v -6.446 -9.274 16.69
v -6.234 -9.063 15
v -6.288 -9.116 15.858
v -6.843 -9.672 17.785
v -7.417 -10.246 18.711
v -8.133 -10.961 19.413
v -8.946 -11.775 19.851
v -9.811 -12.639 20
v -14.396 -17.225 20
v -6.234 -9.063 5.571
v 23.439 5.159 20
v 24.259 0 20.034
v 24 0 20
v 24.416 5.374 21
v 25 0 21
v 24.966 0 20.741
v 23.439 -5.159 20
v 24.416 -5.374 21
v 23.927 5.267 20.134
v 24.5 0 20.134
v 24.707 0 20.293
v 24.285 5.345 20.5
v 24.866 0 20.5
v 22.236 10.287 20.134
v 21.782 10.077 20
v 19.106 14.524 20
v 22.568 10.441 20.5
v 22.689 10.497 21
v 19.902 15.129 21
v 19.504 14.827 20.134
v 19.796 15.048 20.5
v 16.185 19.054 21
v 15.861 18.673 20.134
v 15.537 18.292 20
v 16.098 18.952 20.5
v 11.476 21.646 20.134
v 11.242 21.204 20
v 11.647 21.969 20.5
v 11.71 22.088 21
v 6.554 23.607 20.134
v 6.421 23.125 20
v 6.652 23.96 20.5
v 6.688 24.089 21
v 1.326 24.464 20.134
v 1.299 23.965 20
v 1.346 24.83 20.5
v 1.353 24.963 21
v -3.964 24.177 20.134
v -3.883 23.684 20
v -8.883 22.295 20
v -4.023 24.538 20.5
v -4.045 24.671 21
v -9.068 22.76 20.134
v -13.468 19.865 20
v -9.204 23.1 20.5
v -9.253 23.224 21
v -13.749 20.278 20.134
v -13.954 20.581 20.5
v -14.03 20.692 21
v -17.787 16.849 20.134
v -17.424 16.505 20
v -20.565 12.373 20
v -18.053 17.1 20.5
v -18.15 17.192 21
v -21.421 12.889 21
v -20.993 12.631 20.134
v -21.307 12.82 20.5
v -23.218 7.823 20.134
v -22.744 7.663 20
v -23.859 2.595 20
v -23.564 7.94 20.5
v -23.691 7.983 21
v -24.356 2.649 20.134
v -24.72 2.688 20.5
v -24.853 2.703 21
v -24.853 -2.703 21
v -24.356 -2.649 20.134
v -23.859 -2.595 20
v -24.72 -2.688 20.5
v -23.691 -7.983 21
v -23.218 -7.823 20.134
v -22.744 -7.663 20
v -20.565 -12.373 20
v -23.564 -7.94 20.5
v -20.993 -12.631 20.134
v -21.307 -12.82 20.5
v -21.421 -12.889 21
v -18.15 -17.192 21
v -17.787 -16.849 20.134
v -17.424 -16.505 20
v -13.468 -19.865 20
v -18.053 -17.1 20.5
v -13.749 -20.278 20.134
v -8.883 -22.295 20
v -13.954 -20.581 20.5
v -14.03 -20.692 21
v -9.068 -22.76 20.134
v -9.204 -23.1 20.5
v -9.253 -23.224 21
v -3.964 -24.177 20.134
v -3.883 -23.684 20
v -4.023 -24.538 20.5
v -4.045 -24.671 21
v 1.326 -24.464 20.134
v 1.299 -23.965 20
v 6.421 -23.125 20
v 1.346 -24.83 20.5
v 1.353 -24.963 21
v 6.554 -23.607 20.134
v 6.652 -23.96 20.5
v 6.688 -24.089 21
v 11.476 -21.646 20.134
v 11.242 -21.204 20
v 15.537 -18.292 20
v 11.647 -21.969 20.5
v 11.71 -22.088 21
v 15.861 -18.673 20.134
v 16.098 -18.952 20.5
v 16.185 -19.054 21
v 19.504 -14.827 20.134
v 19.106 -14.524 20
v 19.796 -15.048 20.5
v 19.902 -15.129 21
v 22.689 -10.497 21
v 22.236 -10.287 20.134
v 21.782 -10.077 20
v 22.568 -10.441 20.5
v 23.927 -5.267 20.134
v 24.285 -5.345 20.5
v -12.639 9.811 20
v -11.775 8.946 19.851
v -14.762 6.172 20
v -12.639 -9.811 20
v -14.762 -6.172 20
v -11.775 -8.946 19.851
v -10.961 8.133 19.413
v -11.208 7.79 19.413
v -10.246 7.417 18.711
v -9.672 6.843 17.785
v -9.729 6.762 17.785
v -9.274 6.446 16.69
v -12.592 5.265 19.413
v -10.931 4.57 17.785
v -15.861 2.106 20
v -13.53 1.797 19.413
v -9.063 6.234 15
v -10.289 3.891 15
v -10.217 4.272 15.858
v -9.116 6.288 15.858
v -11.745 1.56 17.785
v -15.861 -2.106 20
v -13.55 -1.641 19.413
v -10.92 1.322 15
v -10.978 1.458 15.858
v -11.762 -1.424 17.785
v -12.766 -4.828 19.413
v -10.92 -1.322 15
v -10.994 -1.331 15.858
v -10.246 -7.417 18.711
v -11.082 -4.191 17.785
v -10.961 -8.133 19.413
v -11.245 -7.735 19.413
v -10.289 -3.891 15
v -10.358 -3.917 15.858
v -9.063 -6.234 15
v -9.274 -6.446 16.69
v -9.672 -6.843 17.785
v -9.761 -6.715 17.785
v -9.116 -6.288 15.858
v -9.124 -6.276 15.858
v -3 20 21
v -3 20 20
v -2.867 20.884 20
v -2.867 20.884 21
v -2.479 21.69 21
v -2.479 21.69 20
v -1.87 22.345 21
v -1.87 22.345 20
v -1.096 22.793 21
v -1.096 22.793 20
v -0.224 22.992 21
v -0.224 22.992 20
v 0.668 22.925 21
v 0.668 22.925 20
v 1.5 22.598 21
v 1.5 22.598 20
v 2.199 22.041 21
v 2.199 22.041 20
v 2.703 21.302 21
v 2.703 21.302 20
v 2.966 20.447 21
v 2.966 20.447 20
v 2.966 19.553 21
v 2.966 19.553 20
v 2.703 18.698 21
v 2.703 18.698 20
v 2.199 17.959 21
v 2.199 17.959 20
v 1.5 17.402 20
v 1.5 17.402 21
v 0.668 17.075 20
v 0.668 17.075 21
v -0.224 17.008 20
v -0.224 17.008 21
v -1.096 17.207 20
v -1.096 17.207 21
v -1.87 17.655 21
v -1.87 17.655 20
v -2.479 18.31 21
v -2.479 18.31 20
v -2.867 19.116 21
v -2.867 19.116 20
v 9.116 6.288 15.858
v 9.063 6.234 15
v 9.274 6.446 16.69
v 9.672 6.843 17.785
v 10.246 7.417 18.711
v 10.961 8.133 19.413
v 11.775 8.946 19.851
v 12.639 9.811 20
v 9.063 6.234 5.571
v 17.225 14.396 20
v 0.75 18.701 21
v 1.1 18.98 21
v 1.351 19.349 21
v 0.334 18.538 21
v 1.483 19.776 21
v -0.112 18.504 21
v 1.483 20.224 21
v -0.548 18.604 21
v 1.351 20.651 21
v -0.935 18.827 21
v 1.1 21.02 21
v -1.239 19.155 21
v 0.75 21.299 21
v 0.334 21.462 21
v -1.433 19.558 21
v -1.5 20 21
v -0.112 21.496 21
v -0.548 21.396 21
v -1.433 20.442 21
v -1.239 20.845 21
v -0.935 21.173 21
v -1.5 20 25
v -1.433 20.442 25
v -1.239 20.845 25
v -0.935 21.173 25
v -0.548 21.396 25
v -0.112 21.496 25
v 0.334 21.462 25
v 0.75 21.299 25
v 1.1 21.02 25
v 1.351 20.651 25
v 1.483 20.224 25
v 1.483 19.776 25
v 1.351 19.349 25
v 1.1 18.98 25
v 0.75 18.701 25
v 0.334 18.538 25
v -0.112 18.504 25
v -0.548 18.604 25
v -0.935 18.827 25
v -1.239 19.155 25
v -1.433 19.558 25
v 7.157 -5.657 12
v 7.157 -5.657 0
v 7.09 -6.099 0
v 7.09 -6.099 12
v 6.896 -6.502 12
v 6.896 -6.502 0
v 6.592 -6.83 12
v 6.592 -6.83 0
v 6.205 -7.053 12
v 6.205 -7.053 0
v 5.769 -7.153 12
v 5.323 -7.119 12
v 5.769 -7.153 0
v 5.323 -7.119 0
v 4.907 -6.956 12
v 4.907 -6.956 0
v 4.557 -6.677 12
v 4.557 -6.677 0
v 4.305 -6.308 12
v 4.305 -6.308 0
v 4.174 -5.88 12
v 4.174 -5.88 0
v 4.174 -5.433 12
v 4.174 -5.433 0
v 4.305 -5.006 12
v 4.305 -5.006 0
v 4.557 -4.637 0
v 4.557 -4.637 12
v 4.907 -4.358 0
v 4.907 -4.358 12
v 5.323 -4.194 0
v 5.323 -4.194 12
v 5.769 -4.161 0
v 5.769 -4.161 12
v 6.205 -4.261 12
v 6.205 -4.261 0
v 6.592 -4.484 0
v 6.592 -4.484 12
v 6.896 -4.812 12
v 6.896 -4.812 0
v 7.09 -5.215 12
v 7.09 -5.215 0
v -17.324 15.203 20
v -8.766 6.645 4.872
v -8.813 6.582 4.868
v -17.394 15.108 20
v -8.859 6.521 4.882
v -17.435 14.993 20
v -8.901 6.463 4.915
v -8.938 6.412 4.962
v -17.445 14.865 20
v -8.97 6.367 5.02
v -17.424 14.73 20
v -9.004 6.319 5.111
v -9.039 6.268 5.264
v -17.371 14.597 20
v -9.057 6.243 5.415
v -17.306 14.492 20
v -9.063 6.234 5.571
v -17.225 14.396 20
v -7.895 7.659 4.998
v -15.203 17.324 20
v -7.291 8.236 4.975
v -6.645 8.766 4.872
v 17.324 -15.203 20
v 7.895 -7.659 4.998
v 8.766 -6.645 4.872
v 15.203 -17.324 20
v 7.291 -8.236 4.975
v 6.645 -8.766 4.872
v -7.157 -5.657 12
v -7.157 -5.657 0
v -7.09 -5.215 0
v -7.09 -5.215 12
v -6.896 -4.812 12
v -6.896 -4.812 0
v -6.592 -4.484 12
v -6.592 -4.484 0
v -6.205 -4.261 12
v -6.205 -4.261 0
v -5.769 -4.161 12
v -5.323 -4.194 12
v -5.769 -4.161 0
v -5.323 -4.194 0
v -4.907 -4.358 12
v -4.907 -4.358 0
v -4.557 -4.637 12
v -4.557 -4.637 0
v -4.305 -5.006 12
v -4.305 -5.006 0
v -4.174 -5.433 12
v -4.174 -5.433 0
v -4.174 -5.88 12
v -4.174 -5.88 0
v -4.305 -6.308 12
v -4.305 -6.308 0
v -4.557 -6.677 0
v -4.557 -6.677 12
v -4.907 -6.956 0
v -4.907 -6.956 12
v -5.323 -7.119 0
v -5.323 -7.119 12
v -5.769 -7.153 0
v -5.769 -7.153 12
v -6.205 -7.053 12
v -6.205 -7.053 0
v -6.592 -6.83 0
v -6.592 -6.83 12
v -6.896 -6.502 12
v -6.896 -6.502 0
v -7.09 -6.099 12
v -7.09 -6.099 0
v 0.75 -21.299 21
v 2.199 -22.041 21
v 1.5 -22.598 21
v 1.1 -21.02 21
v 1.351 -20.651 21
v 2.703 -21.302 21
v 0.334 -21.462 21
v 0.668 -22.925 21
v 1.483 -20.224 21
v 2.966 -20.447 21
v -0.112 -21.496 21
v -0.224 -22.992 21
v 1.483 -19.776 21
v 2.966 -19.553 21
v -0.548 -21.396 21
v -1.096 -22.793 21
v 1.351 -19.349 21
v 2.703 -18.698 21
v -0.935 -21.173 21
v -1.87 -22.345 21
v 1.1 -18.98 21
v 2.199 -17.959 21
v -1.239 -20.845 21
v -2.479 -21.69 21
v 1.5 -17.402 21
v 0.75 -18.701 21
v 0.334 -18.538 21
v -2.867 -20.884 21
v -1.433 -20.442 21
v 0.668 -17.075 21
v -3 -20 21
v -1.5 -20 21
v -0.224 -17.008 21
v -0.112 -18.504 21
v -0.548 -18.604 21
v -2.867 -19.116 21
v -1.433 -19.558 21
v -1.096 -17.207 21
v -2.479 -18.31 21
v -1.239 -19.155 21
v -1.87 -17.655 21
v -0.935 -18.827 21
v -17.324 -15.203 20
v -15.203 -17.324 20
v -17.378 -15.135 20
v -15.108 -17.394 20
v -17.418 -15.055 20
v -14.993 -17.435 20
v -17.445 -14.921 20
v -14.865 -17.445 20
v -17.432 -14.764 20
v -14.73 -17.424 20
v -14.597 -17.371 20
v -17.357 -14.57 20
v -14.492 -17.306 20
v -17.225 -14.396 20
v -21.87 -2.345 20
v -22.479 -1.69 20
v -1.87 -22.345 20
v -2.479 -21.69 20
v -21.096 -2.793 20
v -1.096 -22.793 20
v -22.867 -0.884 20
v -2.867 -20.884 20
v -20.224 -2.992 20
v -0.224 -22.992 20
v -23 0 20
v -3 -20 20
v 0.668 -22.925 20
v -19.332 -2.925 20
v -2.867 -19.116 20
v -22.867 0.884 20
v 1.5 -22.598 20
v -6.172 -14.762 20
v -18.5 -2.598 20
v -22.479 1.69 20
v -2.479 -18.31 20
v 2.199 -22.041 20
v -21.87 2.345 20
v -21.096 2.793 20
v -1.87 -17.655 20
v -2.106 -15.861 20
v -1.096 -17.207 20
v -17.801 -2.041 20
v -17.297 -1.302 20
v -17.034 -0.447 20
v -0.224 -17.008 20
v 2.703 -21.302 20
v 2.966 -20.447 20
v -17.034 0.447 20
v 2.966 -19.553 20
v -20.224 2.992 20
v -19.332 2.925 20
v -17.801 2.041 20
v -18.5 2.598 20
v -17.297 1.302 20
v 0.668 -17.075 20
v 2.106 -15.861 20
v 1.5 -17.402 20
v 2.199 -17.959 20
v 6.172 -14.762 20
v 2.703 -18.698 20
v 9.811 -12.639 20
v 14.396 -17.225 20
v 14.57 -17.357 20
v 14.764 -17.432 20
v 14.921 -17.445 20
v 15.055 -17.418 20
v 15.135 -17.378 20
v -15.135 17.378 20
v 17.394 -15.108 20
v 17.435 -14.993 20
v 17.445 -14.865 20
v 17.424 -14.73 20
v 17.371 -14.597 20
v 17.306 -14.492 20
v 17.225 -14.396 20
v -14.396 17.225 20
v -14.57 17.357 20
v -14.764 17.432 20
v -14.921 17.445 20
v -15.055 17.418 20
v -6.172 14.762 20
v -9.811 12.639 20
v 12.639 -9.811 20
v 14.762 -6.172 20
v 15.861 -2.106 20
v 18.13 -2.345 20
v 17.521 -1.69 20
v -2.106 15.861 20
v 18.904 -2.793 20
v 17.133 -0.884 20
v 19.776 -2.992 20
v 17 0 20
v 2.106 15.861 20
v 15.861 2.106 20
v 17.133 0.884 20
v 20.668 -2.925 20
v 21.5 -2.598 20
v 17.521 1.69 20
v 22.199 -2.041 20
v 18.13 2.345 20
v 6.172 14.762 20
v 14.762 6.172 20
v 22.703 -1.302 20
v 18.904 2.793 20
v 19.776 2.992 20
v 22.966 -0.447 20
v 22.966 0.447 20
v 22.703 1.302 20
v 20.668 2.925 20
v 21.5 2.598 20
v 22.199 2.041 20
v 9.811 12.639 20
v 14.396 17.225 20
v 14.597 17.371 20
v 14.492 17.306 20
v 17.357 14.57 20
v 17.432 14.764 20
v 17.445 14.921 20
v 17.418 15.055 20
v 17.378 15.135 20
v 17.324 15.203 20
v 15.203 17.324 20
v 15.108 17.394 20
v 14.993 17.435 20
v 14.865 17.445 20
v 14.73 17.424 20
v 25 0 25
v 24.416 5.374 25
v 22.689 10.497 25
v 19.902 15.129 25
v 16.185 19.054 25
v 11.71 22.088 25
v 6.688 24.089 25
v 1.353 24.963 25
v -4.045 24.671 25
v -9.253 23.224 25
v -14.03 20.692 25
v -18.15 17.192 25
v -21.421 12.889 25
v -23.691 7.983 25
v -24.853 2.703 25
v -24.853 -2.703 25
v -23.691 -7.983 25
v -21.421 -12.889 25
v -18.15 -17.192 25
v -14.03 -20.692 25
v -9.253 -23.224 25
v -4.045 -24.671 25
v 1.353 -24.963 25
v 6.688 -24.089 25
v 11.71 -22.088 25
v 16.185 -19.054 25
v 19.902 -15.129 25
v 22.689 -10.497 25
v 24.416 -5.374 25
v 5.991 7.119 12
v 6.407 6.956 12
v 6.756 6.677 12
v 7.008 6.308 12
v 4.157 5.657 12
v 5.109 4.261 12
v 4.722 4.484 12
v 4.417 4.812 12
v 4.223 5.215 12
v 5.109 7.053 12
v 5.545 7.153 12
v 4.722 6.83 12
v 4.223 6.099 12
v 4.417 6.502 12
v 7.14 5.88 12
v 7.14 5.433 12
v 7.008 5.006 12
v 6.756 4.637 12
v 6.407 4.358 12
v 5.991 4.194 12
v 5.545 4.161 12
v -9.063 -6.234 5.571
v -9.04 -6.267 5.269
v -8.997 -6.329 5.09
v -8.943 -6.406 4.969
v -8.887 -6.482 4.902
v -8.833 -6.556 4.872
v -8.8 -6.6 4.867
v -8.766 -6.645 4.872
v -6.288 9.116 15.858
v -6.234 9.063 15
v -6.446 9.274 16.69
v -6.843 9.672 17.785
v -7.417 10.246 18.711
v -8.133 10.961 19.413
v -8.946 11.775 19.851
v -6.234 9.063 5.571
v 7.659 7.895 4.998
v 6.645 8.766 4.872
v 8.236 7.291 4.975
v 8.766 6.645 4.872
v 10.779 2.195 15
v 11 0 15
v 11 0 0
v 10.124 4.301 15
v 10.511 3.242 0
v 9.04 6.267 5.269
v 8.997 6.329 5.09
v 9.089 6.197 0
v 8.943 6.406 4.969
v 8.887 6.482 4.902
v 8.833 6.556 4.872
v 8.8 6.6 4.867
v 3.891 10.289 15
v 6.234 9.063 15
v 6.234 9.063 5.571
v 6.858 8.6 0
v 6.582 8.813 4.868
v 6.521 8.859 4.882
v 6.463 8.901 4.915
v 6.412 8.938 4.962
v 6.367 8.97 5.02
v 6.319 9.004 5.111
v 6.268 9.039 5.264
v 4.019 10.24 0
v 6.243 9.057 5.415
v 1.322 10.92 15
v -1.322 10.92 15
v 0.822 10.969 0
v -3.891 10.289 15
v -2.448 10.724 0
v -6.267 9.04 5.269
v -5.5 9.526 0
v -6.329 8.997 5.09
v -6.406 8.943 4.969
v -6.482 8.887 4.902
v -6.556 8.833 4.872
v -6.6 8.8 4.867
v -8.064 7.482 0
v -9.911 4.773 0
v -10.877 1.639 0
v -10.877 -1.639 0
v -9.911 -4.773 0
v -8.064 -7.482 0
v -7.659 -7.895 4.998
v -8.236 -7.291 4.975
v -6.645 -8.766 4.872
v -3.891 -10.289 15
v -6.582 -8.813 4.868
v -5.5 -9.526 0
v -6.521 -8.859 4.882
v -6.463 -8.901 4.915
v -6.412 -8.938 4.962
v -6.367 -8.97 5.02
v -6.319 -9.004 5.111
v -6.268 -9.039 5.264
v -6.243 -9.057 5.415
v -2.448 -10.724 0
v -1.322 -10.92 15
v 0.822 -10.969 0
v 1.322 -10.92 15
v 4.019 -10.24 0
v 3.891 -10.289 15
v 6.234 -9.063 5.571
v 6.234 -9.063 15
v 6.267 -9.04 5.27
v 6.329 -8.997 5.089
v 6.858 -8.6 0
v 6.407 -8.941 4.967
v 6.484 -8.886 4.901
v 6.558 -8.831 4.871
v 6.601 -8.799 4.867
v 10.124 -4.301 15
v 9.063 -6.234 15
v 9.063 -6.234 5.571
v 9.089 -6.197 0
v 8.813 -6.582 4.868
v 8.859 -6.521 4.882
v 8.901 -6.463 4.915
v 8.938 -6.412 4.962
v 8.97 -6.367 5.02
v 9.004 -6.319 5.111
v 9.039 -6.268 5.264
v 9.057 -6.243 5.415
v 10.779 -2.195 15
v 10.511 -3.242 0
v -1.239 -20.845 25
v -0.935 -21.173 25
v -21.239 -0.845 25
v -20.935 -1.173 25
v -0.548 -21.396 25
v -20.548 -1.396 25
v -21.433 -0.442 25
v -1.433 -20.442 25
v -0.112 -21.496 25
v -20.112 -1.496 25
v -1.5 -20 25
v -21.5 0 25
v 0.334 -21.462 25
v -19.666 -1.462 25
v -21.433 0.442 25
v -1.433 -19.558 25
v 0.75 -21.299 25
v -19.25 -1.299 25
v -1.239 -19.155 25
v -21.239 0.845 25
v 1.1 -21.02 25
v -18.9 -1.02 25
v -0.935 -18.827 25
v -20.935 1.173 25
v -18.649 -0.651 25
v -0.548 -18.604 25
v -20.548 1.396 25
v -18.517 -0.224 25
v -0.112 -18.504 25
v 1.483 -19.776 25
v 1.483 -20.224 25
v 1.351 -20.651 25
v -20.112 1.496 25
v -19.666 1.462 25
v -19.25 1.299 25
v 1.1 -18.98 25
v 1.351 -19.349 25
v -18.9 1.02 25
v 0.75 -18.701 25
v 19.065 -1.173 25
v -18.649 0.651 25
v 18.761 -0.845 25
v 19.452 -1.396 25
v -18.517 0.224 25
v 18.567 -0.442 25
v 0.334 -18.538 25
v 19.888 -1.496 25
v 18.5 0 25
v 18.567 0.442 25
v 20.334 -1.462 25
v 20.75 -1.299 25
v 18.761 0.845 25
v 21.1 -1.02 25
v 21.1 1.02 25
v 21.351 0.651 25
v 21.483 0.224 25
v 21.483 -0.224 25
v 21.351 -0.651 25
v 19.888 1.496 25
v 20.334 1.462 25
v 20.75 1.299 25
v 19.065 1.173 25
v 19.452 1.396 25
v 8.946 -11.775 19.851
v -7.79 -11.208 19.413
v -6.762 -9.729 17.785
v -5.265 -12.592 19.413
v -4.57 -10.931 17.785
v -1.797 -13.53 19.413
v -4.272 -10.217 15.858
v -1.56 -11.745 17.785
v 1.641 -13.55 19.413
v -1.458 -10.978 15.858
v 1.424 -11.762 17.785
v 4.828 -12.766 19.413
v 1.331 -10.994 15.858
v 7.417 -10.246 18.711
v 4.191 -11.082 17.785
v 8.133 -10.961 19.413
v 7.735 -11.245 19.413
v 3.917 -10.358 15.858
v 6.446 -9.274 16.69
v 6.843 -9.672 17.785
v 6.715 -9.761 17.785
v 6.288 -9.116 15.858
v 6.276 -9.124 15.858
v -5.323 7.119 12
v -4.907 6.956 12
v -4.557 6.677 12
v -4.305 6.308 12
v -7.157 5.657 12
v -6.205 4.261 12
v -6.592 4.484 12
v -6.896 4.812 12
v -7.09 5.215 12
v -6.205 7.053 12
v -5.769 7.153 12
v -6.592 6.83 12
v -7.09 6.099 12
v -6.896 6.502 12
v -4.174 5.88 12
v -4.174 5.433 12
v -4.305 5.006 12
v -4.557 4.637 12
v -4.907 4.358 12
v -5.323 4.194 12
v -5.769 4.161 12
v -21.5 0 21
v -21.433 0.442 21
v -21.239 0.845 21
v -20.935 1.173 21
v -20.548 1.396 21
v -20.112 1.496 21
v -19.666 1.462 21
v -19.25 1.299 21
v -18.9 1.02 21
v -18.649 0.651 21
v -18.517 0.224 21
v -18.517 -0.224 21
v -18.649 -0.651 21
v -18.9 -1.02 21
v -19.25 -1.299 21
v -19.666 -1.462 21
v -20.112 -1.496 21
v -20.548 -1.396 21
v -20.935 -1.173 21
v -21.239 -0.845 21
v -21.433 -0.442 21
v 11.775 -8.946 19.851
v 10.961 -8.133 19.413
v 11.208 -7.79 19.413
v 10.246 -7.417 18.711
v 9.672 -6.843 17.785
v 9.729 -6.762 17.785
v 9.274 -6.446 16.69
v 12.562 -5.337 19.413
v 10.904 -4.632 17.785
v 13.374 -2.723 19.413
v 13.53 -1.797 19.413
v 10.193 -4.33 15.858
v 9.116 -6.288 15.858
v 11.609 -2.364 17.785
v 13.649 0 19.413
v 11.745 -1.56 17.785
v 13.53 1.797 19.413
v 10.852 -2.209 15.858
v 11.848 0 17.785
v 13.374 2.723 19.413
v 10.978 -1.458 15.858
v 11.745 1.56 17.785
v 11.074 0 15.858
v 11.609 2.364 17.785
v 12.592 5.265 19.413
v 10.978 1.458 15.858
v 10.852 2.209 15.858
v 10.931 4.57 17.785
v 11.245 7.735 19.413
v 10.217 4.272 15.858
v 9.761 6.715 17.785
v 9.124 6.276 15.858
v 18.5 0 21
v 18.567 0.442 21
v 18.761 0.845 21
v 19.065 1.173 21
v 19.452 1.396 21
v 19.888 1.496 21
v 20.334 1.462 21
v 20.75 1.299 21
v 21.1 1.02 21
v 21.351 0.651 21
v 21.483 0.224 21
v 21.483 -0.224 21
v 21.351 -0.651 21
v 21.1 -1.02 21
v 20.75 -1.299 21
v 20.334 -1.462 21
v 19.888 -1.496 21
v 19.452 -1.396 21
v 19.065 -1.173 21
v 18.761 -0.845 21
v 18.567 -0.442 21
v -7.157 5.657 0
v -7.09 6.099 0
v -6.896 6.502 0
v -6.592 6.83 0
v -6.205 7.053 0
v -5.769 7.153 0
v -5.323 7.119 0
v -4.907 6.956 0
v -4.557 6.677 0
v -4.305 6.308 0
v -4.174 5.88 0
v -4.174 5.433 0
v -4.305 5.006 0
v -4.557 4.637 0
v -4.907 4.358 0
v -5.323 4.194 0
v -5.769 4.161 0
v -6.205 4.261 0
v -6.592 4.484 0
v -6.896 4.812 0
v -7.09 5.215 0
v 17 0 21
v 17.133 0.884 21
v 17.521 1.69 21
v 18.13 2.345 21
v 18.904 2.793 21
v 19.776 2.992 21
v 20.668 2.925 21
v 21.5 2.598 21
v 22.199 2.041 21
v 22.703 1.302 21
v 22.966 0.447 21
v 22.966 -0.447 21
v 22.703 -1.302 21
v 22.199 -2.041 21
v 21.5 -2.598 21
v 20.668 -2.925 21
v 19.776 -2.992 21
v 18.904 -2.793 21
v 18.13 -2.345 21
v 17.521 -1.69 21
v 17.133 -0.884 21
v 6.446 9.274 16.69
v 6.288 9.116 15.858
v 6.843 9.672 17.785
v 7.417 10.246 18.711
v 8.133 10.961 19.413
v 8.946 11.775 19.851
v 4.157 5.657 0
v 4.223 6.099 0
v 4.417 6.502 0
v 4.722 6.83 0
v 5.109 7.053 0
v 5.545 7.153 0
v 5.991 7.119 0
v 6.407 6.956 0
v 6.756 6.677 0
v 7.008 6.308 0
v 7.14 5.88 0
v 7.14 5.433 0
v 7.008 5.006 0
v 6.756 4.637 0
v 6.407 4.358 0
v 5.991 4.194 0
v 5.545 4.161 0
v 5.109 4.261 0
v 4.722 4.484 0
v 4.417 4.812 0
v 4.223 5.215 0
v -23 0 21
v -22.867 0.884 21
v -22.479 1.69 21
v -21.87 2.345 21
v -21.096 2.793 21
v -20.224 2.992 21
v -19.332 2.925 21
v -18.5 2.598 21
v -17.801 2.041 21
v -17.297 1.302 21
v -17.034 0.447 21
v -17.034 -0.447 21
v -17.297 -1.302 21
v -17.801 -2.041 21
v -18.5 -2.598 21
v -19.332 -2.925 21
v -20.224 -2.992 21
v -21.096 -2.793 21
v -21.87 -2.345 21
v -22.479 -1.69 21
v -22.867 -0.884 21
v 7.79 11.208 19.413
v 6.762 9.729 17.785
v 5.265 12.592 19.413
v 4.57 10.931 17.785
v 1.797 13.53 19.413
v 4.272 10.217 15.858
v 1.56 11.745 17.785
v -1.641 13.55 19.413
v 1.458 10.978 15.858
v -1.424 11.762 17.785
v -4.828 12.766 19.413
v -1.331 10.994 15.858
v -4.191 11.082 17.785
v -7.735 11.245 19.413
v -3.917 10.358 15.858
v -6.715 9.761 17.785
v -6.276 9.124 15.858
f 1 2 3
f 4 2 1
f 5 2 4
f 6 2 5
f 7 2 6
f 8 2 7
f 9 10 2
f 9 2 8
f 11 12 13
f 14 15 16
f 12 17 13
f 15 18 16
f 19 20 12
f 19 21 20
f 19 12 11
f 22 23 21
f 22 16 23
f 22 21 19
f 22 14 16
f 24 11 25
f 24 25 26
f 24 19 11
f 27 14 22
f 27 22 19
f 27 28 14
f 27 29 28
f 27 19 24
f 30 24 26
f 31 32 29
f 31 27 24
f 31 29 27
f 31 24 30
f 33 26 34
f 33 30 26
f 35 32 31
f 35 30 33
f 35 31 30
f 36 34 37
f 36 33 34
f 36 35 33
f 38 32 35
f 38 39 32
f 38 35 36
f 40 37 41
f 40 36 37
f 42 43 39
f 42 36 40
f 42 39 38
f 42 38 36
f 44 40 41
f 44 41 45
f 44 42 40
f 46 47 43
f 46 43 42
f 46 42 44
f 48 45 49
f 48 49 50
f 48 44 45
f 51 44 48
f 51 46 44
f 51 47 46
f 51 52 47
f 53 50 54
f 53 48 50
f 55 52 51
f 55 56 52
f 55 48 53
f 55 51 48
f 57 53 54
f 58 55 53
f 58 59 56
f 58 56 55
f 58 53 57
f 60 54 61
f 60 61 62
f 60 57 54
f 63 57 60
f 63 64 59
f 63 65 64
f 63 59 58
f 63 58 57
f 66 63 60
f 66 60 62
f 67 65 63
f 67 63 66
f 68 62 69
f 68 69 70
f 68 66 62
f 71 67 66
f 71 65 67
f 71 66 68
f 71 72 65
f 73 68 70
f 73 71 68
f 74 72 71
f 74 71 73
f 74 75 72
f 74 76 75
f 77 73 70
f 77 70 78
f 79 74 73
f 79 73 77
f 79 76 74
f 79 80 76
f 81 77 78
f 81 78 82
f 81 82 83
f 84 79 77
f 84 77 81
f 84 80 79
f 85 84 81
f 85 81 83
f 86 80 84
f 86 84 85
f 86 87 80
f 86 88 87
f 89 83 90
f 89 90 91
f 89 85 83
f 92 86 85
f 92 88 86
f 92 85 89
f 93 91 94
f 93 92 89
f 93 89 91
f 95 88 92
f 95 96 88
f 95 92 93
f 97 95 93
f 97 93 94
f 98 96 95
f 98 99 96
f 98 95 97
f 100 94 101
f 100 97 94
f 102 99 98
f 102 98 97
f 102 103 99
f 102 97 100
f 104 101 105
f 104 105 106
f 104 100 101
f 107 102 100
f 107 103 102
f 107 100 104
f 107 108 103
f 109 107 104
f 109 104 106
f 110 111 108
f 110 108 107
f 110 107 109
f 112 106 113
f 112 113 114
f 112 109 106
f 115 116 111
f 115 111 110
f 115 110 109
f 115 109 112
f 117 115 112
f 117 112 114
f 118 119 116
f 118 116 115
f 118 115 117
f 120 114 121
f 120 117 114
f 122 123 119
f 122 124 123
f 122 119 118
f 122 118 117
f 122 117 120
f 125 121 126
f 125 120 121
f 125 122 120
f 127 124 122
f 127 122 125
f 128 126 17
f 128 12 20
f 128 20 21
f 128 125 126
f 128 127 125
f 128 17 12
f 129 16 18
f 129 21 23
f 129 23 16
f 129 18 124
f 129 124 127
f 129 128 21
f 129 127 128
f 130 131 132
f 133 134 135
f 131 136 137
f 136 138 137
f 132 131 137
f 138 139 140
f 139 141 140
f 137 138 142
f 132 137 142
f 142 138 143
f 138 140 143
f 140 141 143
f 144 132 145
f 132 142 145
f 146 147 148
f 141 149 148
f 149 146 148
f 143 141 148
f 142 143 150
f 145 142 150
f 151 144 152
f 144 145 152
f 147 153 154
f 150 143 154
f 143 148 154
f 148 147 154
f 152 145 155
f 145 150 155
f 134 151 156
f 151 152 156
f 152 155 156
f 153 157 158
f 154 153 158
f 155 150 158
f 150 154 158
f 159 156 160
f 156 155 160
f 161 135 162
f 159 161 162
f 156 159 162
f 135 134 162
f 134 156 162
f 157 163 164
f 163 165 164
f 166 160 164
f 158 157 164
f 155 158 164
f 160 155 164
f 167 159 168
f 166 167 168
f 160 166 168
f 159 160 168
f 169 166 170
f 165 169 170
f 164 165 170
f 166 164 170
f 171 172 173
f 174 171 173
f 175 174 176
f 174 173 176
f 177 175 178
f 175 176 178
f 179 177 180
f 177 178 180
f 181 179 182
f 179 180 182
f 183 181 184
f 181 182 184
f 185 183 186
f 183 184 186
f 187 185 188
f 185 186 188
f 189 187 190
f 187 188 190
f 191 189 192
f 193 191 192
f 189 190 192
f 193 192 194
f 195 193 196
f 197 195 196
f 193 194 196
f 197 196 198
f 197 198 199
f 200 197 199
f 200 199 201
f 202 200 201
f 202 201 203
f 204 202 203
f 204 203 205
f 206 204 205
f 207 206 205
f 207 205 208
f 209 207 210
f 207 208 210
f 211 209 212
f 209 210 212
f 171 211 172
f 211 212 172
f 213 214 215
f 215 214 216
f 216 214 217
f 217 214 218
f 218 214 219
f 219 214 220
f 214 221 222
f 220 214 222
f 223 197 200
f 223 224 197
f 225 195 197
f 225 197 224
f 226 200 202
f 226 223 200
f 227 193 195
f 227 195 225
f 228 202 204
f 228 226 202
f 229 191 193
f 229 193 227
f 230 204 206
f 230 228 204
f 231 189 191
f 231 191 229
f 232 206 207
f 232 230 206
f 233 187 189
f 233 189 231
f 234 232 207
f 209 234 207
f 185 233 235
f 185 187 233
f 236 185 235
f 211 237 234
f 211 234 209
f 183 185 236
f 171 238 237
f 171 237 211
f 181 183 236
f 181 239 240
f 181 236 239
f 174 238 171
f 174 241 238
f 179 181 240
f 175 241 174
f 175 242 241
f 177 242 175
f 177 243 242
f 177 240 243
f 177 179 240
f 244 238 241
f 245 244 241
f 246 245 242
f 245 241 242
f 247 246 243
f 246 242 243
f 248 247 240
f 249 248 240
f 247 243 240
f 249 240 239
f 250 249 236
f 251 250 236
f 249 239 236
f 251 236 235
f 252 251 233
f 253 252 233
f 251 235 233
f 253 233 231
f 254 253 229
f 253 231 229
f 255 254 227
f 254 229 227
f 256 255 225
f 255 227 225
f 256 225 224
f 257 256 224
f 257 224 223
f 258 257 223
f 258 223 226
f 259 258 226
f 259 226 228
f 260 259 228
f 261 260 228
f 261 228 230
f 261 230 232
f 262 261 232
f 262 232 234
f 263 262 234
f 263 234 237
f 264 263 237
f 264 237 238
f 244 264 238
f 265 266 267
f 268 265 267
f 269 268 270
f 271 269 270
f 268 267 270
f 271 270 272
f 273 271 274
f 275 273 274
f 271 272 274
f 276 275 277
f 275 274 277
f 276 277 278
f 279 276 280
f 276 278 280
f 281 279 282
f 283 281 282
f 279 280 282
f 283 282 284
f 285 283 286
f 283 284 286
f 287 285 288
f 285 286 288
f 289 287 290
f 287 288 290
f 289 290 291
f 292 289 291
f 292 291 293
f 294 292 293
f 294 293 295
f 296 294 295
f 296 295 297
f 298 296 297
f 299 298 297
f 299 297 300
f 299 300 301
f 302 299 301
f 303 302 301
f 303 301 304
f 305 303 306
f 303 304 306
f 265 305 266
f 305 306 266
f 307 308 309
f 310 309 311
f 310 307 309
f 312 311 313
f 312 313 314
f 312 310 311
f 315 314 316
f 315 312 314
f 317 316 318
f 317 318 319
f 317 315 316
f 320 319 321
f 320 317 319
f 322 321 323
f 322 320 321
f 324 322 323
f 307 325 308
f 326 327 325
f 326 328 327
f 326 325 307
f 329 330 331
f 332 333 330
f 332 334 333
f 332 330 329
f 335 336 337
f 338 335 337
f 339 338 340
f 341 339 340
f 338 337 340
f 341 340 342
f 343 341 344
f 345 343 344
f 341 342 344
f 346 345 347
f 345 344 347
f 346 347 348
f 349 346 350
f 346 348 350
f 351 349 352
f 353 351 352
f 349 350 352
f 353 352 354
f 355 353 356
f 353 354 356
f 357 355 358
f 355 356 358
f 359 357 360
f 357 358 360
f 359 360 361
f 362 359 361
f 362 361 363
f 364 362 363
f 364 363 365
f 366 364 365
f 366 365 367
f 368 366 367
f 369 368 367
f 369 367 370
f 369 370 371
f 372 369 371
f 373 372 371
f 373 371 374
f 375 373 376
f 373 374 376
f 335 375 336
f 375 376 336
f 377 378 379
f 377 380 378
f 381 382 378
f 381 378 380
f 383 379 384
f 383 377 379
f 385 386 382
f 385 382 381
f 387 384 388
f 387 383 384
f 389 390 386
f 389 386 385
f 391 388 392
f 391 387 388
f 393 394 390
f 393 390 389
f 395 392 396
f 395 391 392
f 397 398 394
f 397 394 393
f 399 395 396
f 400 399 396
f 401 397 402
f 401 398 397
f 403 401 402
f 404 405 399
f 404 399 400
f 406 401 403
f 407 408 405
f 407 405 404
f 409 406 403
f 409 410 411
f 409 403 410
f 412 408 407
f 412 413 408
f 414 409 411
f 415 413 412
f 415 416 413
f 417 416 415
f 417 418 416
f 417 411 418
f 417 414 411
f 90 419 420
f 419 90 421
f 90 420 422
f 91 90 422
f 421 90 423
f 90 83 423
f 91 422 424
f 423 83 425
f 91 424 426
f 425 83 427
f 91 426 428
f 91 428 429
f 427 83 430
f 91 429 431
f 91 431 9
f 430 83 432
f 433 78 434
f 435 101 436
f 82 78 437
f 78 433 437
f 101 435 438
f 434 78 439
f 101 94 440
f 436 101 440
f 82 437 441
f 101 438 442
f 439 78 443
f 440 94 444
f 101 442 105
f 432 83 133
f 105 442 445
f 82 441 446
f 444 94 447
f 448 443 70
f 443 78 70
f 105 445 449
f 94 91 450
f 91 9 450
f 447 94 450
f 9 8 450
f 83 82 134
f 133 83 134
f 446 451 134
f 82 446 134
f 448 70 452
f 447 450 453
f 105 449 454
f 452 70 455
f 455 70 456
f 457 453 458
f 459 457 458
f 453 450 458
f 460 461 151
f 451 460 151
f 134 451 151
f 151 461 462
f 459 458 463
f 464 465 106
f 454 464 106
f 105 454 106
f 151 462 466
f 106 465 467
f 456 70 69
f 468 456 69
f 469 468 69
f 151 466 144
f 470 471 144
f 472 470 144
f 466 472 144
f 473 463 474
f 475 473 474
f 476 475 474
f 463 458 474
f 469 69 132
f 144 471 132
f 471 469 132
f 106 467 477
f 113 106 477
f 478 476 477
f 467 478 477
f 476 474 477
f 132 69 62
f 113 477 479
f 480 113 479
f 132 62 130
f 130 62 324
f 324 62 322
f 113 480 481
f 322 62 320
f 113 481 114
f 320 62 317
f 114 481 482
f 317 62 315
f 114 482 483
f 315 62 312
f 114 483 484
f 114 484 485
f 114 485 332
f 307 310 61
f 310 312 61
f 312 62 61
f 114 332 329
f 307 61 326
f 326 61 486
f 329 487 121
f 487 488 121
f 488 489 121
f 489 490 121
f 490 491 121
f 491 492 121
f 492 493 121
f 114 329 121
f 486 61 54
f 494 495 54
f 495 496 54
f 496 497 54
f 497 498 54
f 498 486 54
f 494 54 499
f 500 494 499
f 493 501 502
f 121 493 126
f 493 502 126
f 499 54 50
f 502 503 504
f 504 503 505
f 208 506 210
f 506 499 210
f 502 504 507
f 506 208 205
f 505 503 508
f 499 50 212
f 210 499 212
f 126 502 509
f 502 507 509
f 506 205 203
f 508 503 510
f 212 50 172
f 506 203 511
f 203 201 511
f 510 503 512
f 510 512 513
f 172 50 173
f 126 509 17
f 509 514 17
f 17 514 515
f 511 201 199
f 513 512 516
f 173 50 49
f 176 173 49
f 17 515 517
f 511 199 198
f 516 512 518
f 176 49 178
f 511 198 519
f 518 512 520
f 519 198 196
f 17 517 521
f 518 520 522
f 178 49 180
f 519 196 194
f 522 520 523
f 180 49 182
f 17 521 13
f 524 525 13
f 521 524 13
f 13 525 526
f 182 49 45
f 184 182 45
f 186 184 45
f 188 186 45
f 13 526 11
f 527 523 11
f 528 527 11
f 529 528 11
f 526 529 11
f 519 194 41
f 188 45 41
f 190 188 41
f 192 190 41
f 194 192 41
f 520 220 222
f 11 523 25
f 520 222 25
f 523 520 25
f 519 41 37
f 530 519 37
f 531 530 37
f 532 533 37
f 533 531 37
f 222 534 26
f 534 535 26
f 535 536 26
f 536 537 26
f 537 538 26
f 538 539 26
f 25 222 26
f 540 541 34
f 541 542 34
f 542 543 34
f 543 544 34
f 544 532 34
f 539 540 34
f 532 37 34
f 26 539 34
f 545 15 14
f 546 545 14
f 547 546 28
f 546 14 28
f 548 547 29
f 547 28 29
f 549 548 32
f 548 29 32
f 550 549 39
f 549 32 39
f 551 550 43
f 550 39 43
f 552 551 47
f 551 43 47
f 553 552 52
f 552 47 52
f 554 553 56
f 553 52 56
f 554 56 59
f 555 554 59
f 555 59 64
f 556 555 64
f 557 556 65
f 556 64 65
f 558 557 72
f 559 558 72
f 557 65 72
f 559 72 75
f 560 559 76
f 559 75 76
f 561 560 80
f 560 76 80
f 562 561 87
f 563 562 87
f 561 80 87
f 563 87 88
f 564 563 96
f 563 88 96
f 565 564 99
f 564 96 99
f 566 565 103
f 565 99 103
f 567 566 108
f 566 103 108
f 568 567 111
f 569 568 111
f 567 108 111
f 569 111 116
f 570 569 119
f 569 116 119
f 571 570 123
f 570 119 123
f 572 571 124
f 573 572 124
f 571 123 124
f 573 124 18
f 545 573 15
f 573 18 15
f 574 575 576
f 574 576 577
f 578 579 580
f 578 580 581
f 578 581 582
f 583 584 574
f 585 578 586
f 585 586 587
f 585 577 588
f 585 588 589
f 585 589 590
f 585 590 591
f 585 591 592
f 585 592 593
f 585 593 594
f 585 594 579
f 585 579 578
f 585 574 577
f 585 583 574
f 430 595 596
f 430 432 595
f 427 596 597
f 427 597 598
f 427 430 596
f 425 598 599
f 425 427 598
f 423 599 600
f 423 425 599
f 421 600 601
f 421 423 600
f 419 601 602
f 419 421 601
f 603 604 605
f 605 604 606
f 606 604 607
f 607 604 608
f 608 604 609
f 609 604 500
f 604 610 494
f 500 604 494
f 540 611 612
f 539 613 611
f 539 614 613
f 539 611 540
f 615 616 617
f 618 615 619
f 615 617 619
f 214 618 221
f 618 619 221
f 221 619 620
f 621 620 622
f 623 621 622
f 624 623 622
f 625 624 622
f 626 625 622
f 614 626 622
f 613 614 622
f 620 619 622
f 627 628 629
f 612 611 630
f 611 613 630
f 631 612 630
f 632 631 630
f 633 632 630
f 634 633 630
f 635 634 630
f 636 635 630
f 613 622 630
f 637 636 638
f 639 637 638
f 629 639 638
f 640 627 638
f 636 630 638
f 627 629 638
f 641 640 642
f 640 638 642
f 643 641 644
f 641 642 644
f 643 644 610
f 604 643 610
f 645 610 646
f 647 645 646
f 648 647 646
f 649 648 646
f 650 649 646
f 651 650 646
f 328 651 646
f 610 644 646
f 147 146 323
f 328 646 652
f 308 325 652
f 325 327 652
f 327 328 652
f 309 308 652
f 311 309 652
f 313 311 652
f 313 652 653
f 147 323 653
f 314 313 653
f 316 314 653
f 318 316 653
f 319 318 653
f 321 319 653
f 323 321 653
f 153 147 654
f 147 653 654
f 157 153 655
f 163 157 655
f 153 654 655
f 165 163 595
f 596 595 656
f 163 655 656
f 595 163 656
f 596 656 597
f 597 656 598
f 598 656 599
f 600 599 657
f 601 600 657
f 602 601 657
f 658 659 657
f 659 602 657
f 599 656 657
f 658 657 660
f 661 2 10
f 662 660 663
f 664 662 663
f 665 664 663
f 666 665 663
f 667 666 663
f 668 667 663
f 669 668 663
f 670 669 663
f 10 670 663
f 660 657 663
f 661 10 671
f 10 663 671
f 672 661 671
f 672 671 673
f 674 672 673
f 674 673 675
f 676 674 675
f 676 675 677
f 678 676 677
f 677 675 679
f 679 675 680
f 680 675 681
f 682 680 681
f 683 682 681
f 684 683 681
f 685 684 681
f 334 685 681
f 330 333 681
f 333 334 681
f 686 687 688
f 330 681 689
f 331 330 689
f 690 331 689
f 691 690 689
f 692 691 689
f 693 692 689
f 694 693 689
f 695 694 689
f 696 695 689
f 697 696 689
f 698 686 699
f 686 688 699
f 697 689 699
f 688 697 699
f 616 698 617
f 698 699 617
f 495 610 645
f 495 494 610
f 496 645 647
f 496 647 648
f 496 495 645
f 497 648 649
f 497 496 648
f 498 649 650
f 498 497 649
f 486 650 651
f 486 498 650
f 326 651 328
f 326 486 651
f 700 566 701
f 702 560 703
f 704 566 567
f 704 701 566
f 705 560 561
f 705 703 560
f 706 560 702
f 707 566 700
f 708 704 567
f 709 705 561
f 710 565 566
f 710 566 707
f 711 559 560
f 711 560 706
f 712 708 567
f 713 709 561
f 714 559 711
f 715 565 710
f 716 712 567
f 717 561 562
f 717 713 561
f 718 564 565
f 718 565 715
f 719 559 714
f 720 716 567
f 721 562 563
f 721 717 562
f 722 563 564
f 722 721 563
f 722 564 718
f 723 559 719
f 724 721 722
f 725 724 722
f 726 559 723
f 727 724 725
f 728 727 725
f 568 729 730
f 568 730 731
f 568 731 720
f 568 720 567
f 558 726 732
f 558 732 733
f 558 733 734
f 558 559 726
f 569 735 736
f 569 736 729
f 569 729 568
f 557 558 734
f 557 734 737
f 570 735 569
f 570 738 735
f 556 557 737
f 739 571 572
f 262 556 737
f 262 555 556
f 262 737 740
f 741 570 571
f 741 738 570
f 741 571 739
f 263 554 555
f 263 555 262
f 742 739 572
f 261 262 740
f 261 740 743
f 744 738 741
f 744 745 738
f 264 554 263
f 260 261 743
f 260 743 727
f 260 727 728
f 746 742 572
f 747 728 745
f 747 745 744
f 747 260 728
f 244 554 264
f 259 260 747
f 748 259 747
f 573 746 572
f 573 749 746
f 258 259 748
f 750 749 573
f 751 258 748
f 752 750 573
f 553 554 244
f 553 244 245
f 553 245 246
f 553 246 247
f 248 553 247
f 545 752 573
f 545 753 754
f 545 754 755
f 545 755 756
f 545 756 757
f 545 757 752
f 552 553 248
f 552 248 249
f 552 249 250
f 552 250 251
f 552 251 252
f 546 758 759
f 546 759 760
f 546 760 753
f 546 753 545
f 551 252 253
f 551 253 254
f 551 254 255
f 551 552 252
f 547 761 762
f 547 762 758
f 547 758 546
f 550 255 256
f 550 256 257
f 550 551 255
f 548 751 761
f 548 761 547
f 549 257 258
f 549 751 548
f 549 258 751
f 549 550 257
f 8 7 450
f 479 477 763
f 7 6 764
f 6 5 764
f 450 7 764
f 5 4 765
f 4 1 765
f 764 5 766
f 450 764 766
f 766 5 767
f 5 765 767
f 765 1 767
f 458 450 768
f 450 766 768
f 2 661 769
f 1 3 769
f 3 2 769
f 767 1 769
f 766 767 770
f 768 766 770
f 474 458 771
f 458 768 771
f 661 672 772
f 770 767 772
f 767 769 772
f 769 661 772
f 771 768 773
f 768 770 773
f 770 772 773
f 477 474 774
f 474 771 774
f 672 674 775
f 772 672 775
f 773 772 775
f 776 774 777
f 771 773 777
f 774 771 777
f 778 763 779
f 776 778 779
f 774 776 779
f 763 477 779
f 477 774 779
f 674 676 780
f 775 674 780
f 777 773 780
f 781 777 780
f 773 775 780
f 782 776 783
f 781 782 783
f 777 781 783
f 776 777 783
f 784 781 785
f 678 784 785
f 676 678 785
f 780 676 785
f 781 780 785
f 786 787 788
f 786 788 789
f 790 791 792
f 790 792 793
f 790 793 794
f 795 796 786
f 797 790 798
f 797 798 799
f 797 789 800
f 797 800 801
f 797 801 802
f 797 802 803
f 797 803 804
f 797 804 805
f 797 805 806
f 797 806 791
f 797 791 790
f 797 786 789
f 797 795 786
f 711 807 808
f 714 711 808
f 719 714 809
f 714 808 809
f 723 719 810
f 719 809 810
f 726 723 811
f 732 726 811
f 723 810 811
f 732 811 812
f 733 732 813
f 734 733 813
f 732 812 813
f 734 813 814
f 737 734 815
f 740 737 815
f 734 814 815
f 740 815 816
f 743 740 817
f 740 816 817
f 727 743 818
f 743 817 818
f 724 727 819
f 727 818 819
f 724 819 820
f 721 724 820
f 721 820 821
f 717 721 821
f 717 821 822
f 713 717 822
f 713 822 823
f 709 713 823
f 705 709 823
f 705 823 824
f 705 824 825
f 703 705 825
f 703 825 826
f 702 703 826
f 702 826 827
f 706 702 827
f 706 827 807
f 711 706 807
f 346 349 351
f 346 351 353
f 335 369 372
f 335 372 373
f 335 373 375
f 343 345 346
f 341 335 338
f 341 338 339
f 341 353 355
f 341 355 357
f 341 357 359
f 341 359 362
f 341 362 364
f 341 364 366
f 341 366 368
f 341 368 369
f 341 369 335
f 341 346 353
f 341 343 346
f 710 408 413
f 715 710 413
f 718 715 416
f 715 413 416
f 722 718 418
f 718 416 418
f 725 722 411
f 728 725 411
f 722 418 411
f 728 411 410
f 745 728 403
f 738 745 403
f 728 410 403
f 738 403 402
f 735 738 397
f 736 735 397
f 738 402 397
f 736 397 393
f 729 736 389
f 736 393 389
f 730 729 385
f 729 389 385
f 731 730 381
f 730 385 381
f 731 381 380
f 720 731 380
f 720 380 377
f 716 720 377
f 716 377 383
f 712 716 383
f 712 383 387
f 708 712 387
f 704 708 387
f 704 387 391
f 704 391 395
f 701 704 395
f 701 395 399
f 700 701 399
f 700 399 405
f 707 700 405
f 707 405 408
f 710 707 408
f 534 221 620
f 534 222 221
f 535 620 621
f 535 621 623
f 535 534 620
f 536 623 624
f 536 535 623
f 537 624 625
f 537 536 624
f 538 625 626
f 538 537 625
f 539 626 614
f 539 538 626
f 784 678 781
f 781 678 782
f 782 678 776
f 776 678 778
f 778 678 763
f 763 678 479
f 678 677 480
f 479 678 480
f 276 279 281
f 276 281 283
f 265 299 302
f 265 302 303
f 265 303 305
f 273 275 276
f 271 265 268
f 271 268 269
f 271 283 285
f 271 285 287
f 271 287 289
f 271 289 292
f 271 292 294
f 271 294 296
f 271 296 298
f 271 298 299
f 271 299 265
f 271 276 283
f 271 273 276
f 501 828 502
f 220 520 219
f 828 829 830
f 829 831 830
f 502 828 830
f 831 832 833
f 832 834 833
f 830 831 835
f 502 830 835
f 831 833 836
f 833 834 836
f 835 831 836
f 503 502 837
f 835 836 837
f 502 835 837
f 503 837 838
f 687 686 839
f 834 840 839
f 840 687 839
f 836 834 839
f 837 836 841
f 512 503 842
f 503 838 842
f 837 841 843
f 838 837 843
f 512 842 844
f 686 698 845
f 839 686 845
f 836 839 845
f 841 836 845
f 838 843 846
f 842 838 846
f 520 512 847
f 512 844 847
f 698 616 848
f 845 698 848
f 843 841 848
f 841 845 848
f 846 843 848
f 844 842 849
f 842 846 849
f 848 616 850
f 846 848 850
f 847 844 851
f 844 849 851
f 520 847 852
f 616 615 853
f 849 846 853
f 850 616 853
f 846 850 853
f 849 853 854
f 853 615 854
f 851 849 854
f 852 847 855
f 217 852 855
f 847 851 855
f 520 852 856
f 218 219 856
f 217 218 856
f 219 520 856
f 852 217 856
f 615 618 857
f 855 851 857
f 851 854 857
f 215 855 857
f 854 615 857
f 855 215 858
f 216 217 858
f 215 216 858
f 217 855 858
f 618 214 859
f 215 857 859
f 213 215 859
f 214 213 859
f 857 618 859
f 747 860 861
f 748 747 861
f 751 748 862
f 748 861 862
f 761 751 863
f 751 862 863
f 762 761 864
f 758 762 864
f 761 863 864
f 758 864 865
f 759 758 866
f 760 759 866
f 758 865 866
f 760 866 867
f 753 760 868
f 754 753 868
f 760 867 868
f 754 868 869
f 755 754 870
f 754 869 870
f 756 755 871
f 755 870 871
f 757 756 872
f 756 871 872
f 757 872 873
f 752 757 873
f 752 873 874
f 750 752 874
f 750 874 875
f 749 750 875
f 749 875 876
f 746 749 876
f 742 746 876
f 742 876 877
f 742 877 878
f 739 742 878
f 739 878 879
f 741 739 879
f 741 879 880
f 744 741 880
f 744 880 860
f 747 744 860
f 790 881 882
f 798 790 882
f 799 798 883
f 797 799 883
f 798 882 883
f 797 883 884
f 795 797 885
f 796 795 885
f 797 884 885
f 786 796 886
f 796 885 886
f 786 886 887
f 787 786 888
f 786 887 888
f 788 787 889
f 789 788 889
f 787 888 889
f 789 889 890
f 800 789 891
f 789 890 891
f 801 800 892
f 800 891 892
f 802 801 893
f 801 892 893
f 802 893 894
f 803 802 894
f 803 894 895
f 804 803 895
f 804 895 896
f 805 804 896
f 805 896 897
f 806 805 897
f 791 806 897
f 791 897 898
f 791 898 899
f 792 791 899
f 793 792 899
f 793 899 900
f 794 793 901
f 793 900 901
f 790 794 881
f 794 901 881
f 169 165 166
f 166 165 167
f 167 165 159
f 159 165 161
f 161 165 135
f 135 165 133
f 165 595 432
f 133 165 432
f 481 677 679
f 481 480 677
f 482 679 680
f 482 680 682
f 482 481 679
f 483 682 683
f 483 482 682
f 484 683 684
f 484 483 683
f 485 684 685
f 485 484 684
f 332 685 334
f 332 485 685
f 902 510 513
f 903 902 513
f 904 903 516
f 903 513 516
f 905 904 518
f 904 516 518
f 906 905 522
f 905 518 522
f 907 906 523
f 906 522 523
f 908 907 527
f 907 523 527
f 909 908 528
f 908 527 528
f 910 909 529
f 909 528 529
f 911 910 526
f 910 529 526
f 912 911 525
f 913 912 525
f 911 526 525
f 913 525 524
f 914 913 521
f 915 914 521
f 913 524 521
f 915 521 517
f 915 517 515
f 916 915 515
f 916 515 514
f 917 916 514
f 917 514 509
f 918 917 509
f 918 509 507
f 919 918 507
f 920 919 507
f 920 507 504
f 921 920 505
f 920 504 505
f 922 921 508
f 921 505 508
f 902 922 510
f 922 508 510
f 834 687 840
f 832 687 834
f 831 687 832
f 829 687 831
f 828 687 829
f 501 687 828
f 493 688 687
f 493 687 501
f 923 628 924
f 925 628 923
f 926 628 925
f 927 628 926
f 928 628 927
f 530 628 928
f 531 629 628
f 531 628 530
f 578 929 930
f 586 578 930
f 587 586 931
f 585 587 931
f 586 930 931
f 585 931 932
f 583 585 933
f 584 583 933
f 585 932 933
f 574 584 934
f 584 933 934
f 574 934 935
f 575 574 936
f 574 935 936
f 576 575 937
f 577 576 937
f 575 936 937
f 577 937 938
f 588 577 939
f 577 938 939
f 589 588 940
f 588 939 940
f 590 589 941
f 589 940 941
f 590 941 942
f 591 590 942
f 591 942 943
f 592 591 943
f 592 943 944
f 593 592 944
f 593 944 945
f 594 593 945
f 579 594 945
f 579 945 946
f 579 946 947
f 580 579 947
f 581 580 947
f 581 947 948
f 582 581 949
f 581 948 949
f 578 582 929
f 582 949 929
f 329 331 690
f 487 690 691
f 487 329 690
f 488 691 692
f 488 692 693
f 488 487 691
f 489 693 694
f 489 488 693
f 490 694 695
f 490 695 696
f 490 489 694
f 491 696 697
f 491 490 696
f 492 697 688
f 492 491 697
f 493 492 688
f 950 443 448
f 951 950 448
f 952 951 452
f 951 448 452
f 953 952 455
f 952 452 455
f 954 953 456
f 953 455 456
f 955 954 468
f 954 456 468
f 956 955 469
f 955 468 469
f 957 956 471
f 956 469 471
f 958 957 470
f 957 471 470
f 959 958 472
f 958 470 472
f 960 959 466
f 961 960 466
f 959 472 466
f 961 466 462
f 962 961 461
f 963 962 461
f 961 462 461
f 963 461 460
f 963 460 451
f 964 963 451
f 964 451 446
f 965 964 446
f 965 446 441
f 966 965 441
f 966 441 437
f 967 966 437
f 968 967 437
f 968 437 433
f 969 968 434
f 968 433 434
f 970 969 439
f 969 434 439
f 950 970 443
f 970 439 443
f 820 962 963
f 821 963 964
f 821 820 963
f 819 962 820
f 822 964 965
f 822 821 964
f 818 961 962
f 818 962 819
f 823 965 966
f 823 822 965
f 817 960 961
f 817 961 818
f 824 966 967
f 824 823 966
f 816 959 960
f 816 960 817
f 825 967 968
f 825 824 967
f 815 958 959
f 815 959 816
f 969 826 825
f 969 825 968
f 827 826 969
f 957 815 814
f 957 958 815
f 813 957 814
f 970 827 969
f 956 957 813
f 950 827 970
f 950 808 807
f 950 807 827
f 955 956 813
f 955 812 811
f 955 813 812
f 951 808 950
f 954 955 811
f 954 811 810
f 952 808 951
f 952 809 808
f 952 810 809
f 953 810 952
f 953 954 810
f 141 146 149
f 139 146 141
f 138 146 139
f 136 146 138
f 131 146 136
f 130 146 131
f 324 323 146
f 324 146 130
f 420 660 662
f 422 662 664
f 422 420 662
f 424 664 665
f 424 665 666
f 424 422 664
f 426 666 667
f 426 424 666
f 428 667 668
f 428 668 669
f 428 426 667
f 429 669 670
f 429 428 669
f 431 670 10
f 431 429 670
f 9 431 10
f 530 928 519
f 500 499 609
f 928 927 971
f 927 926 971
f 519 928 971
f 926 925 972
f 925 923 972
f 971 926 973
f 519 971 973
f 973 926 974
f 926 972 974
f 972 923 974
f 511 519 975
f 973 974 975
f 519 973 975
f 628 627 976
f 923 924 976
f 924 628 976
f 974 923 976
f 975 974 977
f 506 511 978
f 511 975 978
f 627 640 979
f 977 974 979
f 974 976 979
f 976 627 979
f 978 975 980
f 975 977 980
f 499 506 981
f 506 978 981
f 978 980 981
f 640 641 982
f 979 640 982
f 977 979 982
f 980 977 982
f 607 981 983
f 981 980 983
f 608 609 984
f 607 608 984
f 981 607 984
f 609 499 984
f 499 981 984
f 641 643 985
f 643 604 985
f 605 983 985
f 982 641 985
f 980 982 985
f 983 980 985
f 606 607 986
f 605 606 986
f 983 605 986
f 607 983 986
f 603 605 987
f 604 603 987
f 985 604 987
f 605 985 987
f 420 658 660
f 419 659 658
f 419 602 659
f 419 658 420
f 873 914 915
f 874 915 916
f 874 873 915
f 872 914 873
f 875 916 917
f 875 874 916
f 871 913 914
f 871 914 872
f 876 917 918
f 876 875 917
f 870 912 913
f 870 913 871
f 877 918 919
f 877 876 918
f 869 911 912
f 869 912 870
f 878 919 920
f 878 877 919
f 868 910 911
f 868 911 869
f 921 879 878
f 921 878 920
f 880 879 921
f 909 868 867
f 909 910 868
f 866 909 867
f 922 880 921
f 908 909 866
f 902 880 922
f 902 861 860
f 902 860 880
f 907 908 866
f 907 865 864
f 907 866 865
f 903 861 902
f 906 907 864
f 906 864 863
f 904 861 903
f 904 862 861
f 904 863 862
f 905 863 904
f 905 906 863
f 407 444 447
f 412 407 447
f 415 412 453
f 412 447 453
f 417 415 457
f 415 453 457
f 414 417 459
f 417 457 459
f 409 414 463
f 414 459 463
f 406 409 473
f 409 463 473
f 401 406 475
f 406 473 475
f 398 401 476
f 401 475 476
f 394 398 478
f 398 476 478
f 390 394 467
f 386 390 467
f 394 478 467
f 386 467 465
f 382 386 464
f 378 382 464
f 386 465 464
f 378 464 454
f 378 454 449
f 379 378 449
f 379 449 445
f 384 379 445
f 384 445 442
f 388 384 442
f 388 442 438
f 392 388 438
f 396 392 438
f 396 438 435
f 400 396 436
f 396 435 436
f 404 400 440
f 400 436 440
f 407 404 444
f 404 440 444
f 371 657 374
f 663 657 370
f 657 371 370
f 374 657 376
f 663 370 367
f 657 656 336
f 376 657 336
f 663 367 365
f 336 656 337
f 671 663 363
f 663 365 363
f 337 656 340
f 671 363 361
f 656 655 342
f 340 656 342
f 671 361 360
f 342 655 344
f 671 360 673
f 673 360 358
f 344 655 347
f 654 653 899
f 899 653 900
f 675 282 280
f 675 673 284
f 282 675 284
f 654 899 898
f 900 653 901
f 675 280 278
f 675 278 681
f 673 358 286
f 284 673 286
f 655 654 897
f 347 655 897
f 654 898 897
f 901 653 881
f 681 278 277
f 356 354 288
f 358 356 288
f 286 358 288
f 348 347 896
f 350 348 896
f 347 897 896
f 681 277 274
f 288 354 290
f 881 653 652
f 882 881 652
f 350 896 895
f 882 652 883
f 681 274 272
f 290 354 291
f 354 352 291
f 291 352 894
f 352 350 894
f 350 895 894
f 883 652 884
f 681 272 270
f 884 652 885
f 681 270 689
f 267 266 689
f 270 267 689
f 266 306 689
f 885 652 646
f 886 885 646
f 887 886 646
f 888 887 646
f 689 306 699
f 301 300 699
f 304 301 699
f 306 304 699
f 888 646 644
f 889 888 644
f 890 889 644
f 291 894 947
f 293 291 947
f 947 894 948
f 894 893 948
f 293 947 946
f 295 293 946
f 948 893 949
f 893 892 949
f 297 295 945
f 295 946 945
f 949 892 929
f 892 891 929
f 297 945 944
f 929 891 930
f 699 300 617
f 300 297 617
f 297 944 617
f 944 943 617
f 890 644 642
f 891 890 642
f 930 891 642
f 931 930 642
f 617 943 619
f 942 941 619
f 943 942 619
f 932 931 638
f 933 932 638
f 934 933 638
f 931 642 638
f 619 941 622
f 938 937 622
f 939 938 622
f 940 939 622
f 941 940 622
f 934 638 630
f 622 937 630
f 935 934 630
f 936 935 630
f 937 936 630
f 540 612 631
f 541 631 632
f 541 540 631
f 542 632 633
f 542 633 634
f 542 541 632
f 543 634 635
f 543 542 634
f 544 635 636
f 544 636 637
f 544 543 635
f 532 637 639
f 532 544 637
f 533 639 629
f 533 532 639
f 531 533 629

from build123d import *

# Parameters (mm, degrees)
SKETCH1_R           = 11
BOSS_EXTRUDE1_DEPTH = 20
SKETCH5_R           = 25
BOSS_EXTRUDE2_DEPTH = 5
CUT_EXTRUDE2_REACH  = 42.62
SKETCH6_R           = 1.5
FILLET2_R           = 5
RIB10_REACH         = 45.301
SKETCH12_WALL_W     = 107.81191309
SKETCH12_WALL_H     = 4
CIRPATTERN1_COUNT   = 4
FILLET3_R           = 1
FILLET4_R           = 0.5
SKETCH13_R          = 3
CUT_EXTRUDE3_DEPTH  = 1
SKETCH14_R          = 1.5
CUT_EXTRUDE4_DEPTH  = 12


with BuildPart() as part:
    # Sketch1 → Boss-Extrude1 (new body)
    with BuildSketch(Plane.XY):
        Circle(SKETCH1_R)
    extrude(amount=BOSS_EXTRUDE1_DEPTH)

    # Sketch5 → Boss-Extrude2 (add)
    with BuildSketch(Plane.XY.offset(20)):
        Circle(SKETCH5_R)
    extrude(amount=BOSS_EXTRUDE2_DEPTH)

    # Sketch6 → Cut-Extrude2 (cut, up to next)
    with BuildSketch(Plane(origin=(0, 0, 20), x_dir=(-1, 0, 0), z_dir=(0, 0, -1)), mode=Mode.PRIVATE) as cut_extrude2_sk1:
        with Locations((0, 20)):
            Circle(SKETCH6_R)
    cut_extrude2_tool1 = extrude(cut_extrude2_sk1.sketch, amount=-CUT_EXTRUDE2_REACH, mode=Mode.PRIVATE) & part.part
    # Sketch6 → Cut-Extrude2 (cut, up to next)
    with BuildSketch(Plane(origin=(0, 0, 20), x_dir=(-1, 0, 0), z_dir=(0, 0, -1)), mode=Mode.PRIVATE) as cut_extrude2_sk2:
        with Locations((0, -20)):
            Circle(SKETCH6_R)
    cut_extrude2_tool2 = extrude(cut_extrude2_sk2.sketch, amount=-CUT_EXTRUDE2_REACH, mode=Mode.PRIVATE) & part.part
    # Sketch6 → Cut-Extrude2 (cut, up to next)
    with BuildSketch(Plane(origin=(0, 0, 20), x_dir=(-1, 0, 0), z_dir=(0, 0, -1)), mode=Mode.PRIVATE) as cut_extrude2_sk3:
        with Locations((-20, 0)):
            Circle(SKETCH6_R)
    cut_extrude2_tool3 = extrude(cut_extrude2_sk3.sketch, amount=-CUT_EXTRUDE2_REACH, mode=Mode.PRIVATE) & part.part
    # Sketch6 → Cut-Extrude2 (cut, up to next)
    with BuildSketch(Plane(origin=(0, 0, 20), x_dir=(-1, 0, 0), z_dir=(0, 0, -1)), mode=Mode.PRIVATE) as cut_extrude2_sk4:
        with Locations((20, 0)):
            Circle(SKETCH6_R)
    cut_extrude2_tool4 = extrude(cut_extrude2_sk4.sketch, amount=-CUT_EXTRUDE2_REACH, mode=Mode.PRIVATE) & part.part
    add(cut_extrude2_tool1.solids().sort_by_distance((0, 20, 20))[0], mode=Mode.SUBTRACT)
    add(cut_extrude2_tool2.solids().sort_by_distance((0, -20, 20))[0], mode=Mode.SUBTRACT)
    add(cut_extrude2_tool3.solids().sort_by_distance((20, 0, 20))[0], mode=Mode.SUBTRACT)
    add(cut_extrude2_tool4.solids().sort_by_distance((-20, 0, 20))[0], mode=Mode.SUBTRACT)

    # Fillet2
    fillet2_edges = [part.edges().sort_by_distance(p)[0] for p in [
        (-11, 0, 20),
    ]]
    fillet(fillet2_edges, radius=FILLET2_R)

    # Sketch12 wall → Rib10 (add, up to next)
    with BuildSketch(Plane(origin=(12.02081528, 12.02081528, 12.5), x_dir=(0.441726104292, 0.441726104292, 0.780868809452), z_dir=(0.55215763038, 0.55215763038, -0.624695047544)), mode=Mode.PRIVATE) as rib10_sk1:
        Rectangle(SKETCH12_WALL_W, SKETCH12_WALL_H)
    rib10_tool1 = extrude(rib10_sk1.sketch, amount=-RIB10_REACH, mode=Mode.PRIVATE) - part.part
    rib10 = rib10_tool1.solids().sort_by_distance((12.02081528, 12.02081528, 12.5))[0]
    add(rib10)

    # CirPattern1: Rib10 ×4 about axis
    cirpattern1_axis = Axis((0, 0, 0), (0, 0, 1))
    for i in range(1, CIRPATTERN1_COUNT):
        add(rib10.rotate(cirpattern1_axis, i * 360 / CIRPATTERN1_COUNT))

    # Fillet3
    fillet3_edges = [part.edges().sort_by_distance(p)[0] for p in [
        (-25, 0, 20),
    ]]
    fillet(fillet3_edges, radius=FILLET3_R)

    # Fillet4
    fillet4_edges = [part.edges().sort_by_distance(p)[0] for p in [
        (10.541779056, -13.370206181, 12.385408642),
        (13.370206181, -10.541779056, 12.385408642),
        (-10.541779056, -13.370206181, 12.385408642),
        (-13.370206181, -10.541779056, 12.385408642),
        (13.370206181, 10.541779056, 12.385408642),
        (10.541779056, 13.370206181, 12.385408642),
        (-13.370206181, 10.541779056, 12.385408642),
        (-10.541779056, 13.370206181, 12.385408642),
    ]]
    fillet(fillet4_edges, radius=FILLET4_R)

    # Sketch13 → Cut-Extrude3 (cut)
    with BuildSketch(Plane(origin=(0, 0, 20), x_dir=(-1, 0, 0), z_dir=(0, 0, -1))):
        with Locations((-20, 0)):
            Circle(SKETCH13_R)
        with Locations((0, 20)):
            Circle(SKETCH13_R)
        with Locations((20, 0)):
            Circle(SKETCH13_R)
        with Locations((0, -20)):
            Circle(SKETCH13_R)
    extrude(amount=-CUT_EXTRUDE3_DEPTH, mode=Mode.SUBTRACT)

    # Sketch14 → Cut-Extrude4 (cut)
    with BuildSketch(Plane(origin=(0, 0, 0), x_dir=(-1, 0, 0), z_dir=(0, 0, -1))):
        with Locations((-5.656854249, 5.656854249)):
            Circle(SKETCH14_R)
        with Locations((5.656854249, -5.656854249)):
            Circle(SKETCH14_R)
        with Locations((5.656854249, 5.656854249)):
            Circle(SKETCH14_R)
        with Locations(Location((-5.656854249, -5.656854249, 0), (0, 0, 180))):
            Circle(SKETCH14_R)
    extrude(amount=-CUT_EXTRUDE4_DEPTH, mode=Mode.SUBTRACT)


solid = part.part
